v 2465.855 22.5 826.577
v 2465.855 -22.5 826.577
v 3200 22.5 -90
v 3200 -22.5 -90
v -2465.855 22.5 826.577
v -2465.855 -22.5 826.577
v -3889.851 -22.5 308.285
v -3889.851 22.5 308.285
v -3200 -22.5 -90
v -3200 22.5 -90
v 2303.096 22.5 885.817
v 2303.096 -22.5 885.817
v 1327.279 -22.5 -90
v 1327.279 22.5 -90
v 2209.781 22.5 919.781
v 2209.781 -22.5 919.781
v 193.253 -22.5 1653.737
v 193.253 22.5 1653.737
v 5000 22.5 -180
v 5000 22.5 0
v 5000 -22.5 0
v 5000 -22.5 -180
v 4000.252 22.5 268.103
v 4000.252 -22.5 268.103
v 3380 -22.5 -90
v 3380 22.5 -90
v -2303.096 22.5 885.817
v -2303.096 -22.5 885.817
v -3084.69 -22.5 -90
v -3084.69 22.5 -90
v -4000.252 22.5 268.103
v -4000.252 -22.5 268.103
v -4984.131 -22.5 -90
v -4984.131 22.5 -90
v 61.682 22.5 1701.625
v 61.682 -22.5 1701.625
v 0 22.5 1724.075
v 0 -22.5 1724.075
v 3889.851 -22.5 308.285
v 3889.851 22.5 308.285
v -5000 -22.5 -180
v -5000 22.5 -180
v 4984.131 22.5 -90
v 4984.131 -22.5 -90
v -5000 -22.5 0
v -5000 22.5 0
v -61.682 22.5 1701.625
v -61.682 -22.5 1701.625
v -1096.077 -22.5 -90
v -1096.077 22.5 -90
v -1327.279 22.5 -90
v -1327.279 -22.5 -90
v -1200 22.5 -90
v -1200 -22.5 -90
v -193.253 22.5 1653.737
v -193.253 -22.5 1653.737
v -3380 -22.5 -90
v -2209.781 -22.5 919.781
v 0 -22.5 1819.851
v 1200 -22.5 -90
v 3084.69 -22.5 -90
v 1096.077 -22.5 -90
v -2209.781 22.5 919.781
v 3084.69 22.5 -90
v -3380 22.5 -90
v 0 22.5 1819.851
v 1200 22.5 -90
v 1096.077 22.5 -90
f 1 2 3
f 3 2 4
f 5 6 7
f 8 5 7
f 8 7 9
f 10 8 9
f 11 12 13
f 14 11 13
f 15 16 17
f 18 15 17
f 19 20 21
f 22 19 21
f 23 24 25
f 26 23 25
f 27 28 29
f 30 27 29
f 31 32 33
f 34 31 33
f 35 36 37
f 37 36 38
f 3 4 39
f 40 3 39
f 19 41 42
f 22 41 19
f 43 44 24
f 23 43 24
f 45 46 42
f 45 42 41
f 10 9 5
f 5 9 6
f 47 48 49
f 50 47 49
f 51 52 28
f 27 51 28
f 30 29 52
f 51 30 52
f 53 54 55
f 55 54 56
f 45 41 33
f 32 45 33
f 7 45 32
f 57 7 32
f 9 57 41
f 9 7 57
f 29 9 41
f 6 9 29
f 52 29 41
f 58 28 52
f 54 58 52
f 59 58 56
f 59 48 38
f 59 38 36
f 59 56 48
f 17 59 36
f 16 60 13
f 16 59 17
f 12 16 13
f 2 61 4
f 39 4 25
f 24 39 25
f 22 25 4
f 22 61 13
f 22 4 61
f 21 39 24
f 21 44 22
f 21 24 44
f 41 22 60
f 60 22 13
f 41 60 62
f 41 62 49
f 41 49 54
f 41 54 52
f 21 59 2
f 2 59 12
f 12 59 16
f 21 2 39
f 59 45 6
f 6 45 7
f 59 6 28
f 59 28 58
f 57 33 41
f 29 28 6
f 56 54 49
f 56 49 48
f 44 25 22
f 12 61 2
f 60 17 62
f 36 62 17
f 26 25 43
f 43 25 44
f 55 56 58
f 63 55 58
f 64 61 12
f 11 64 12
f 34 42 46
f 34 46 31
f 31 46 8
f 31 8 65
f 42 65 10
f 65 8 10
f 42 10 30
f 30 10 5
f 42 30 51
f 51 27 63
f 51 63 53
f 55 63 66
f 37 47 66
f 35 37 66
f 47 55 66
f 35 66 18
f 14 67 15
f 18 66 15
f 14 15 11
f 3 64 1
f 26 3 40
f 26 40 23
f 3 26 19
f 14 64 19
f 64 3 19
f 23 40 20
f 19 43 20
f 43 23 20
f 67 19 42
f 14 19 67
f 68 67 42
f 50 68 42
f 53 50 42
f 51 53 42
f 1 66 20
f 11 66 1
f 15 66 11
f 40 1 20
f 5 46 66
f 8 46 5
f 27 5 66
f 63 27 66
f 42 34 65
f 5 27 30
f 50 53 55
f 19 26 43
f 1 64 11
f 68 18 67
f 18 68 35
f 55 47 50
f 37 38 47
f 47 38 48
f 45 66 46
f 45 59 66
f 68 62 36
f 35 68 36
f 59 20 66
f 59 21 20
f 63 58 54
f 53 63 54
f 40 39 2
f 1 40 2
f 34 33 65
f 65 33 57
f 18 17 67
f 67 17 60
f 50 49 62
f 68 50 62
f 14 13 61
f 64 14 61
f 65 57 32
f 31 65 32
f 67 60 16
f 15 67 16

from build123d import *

# Parameters (mm, degrees)
F1_DEPTH  = 22.5
F1_FACE_W = 10000
F1_FACE_H = 45
F2_DEPTH  = 180
F4_DEPTH  = 45.001


with BuildPart() as f1:
    # F0 (on Front) → F1 (new body, symmetric)
    with BuildSketch(Plane.XZ):
        Polygon((0, 1819.851171), (-5000, 0), (5000, 0), align=None)
    extrude(amount=F1_DEPTH, both=True)

    # F1_face (on face) → F2 (join)
    with BuildSketch(Plane(origin=(0, 0, 0), x_dir=(1, 0, 0), z_dir=(0, 0, -1))):
        Rectangle(F1_FACE_W, F1_FACE_H)
    extrude(amount=F2_DEPTH)

    # F3 (on face) → F4 (cut, through all)
    with BuildSketch(Plane.XZ.offset(22.5)):
        Polygon((-4000.251944, 268.102574), (-4984.13068, -90), (-3380.000091, -90), align=None)
        Polygon((-1200, -90), (-193.253061, 1653.736849), (-2209.780782, 919.780782), align=None)
        Polygon((0, 1724.075211), (-61.681863, 1701.624849), (-1096.076952, -90), (1096.076952, -90), (61.681863, 1701.624849), align=None)
        Polygon((-3084.689586, -90), (-1327.279267, -90), (-2303.096064, 885.816797), align=None)
        Polygon((3200, -90), (3889.850544, 308.285397), (2465.855105, 826.577351), align=None)
        Polygon((1200, -90), (2209.780782, 919.780782), (193.253061, 1653.736849), align=None)
        Polygon((2303.096064, 885.816797), (1327.279267, -90), (3084.689586, -90), align=None)
        Polygon((3380.000091, -90), (4984.13068, -90), (4000.251944, 268.102574), align=None)
        Polygon((-3889.850544, 308.285397), (-3200, -90), (-2465.855105, 826.577351), align=None)
    extrude(amount=-F4_DEPTH, mode=Mode.SUBTRACT)


solid = f1.part
